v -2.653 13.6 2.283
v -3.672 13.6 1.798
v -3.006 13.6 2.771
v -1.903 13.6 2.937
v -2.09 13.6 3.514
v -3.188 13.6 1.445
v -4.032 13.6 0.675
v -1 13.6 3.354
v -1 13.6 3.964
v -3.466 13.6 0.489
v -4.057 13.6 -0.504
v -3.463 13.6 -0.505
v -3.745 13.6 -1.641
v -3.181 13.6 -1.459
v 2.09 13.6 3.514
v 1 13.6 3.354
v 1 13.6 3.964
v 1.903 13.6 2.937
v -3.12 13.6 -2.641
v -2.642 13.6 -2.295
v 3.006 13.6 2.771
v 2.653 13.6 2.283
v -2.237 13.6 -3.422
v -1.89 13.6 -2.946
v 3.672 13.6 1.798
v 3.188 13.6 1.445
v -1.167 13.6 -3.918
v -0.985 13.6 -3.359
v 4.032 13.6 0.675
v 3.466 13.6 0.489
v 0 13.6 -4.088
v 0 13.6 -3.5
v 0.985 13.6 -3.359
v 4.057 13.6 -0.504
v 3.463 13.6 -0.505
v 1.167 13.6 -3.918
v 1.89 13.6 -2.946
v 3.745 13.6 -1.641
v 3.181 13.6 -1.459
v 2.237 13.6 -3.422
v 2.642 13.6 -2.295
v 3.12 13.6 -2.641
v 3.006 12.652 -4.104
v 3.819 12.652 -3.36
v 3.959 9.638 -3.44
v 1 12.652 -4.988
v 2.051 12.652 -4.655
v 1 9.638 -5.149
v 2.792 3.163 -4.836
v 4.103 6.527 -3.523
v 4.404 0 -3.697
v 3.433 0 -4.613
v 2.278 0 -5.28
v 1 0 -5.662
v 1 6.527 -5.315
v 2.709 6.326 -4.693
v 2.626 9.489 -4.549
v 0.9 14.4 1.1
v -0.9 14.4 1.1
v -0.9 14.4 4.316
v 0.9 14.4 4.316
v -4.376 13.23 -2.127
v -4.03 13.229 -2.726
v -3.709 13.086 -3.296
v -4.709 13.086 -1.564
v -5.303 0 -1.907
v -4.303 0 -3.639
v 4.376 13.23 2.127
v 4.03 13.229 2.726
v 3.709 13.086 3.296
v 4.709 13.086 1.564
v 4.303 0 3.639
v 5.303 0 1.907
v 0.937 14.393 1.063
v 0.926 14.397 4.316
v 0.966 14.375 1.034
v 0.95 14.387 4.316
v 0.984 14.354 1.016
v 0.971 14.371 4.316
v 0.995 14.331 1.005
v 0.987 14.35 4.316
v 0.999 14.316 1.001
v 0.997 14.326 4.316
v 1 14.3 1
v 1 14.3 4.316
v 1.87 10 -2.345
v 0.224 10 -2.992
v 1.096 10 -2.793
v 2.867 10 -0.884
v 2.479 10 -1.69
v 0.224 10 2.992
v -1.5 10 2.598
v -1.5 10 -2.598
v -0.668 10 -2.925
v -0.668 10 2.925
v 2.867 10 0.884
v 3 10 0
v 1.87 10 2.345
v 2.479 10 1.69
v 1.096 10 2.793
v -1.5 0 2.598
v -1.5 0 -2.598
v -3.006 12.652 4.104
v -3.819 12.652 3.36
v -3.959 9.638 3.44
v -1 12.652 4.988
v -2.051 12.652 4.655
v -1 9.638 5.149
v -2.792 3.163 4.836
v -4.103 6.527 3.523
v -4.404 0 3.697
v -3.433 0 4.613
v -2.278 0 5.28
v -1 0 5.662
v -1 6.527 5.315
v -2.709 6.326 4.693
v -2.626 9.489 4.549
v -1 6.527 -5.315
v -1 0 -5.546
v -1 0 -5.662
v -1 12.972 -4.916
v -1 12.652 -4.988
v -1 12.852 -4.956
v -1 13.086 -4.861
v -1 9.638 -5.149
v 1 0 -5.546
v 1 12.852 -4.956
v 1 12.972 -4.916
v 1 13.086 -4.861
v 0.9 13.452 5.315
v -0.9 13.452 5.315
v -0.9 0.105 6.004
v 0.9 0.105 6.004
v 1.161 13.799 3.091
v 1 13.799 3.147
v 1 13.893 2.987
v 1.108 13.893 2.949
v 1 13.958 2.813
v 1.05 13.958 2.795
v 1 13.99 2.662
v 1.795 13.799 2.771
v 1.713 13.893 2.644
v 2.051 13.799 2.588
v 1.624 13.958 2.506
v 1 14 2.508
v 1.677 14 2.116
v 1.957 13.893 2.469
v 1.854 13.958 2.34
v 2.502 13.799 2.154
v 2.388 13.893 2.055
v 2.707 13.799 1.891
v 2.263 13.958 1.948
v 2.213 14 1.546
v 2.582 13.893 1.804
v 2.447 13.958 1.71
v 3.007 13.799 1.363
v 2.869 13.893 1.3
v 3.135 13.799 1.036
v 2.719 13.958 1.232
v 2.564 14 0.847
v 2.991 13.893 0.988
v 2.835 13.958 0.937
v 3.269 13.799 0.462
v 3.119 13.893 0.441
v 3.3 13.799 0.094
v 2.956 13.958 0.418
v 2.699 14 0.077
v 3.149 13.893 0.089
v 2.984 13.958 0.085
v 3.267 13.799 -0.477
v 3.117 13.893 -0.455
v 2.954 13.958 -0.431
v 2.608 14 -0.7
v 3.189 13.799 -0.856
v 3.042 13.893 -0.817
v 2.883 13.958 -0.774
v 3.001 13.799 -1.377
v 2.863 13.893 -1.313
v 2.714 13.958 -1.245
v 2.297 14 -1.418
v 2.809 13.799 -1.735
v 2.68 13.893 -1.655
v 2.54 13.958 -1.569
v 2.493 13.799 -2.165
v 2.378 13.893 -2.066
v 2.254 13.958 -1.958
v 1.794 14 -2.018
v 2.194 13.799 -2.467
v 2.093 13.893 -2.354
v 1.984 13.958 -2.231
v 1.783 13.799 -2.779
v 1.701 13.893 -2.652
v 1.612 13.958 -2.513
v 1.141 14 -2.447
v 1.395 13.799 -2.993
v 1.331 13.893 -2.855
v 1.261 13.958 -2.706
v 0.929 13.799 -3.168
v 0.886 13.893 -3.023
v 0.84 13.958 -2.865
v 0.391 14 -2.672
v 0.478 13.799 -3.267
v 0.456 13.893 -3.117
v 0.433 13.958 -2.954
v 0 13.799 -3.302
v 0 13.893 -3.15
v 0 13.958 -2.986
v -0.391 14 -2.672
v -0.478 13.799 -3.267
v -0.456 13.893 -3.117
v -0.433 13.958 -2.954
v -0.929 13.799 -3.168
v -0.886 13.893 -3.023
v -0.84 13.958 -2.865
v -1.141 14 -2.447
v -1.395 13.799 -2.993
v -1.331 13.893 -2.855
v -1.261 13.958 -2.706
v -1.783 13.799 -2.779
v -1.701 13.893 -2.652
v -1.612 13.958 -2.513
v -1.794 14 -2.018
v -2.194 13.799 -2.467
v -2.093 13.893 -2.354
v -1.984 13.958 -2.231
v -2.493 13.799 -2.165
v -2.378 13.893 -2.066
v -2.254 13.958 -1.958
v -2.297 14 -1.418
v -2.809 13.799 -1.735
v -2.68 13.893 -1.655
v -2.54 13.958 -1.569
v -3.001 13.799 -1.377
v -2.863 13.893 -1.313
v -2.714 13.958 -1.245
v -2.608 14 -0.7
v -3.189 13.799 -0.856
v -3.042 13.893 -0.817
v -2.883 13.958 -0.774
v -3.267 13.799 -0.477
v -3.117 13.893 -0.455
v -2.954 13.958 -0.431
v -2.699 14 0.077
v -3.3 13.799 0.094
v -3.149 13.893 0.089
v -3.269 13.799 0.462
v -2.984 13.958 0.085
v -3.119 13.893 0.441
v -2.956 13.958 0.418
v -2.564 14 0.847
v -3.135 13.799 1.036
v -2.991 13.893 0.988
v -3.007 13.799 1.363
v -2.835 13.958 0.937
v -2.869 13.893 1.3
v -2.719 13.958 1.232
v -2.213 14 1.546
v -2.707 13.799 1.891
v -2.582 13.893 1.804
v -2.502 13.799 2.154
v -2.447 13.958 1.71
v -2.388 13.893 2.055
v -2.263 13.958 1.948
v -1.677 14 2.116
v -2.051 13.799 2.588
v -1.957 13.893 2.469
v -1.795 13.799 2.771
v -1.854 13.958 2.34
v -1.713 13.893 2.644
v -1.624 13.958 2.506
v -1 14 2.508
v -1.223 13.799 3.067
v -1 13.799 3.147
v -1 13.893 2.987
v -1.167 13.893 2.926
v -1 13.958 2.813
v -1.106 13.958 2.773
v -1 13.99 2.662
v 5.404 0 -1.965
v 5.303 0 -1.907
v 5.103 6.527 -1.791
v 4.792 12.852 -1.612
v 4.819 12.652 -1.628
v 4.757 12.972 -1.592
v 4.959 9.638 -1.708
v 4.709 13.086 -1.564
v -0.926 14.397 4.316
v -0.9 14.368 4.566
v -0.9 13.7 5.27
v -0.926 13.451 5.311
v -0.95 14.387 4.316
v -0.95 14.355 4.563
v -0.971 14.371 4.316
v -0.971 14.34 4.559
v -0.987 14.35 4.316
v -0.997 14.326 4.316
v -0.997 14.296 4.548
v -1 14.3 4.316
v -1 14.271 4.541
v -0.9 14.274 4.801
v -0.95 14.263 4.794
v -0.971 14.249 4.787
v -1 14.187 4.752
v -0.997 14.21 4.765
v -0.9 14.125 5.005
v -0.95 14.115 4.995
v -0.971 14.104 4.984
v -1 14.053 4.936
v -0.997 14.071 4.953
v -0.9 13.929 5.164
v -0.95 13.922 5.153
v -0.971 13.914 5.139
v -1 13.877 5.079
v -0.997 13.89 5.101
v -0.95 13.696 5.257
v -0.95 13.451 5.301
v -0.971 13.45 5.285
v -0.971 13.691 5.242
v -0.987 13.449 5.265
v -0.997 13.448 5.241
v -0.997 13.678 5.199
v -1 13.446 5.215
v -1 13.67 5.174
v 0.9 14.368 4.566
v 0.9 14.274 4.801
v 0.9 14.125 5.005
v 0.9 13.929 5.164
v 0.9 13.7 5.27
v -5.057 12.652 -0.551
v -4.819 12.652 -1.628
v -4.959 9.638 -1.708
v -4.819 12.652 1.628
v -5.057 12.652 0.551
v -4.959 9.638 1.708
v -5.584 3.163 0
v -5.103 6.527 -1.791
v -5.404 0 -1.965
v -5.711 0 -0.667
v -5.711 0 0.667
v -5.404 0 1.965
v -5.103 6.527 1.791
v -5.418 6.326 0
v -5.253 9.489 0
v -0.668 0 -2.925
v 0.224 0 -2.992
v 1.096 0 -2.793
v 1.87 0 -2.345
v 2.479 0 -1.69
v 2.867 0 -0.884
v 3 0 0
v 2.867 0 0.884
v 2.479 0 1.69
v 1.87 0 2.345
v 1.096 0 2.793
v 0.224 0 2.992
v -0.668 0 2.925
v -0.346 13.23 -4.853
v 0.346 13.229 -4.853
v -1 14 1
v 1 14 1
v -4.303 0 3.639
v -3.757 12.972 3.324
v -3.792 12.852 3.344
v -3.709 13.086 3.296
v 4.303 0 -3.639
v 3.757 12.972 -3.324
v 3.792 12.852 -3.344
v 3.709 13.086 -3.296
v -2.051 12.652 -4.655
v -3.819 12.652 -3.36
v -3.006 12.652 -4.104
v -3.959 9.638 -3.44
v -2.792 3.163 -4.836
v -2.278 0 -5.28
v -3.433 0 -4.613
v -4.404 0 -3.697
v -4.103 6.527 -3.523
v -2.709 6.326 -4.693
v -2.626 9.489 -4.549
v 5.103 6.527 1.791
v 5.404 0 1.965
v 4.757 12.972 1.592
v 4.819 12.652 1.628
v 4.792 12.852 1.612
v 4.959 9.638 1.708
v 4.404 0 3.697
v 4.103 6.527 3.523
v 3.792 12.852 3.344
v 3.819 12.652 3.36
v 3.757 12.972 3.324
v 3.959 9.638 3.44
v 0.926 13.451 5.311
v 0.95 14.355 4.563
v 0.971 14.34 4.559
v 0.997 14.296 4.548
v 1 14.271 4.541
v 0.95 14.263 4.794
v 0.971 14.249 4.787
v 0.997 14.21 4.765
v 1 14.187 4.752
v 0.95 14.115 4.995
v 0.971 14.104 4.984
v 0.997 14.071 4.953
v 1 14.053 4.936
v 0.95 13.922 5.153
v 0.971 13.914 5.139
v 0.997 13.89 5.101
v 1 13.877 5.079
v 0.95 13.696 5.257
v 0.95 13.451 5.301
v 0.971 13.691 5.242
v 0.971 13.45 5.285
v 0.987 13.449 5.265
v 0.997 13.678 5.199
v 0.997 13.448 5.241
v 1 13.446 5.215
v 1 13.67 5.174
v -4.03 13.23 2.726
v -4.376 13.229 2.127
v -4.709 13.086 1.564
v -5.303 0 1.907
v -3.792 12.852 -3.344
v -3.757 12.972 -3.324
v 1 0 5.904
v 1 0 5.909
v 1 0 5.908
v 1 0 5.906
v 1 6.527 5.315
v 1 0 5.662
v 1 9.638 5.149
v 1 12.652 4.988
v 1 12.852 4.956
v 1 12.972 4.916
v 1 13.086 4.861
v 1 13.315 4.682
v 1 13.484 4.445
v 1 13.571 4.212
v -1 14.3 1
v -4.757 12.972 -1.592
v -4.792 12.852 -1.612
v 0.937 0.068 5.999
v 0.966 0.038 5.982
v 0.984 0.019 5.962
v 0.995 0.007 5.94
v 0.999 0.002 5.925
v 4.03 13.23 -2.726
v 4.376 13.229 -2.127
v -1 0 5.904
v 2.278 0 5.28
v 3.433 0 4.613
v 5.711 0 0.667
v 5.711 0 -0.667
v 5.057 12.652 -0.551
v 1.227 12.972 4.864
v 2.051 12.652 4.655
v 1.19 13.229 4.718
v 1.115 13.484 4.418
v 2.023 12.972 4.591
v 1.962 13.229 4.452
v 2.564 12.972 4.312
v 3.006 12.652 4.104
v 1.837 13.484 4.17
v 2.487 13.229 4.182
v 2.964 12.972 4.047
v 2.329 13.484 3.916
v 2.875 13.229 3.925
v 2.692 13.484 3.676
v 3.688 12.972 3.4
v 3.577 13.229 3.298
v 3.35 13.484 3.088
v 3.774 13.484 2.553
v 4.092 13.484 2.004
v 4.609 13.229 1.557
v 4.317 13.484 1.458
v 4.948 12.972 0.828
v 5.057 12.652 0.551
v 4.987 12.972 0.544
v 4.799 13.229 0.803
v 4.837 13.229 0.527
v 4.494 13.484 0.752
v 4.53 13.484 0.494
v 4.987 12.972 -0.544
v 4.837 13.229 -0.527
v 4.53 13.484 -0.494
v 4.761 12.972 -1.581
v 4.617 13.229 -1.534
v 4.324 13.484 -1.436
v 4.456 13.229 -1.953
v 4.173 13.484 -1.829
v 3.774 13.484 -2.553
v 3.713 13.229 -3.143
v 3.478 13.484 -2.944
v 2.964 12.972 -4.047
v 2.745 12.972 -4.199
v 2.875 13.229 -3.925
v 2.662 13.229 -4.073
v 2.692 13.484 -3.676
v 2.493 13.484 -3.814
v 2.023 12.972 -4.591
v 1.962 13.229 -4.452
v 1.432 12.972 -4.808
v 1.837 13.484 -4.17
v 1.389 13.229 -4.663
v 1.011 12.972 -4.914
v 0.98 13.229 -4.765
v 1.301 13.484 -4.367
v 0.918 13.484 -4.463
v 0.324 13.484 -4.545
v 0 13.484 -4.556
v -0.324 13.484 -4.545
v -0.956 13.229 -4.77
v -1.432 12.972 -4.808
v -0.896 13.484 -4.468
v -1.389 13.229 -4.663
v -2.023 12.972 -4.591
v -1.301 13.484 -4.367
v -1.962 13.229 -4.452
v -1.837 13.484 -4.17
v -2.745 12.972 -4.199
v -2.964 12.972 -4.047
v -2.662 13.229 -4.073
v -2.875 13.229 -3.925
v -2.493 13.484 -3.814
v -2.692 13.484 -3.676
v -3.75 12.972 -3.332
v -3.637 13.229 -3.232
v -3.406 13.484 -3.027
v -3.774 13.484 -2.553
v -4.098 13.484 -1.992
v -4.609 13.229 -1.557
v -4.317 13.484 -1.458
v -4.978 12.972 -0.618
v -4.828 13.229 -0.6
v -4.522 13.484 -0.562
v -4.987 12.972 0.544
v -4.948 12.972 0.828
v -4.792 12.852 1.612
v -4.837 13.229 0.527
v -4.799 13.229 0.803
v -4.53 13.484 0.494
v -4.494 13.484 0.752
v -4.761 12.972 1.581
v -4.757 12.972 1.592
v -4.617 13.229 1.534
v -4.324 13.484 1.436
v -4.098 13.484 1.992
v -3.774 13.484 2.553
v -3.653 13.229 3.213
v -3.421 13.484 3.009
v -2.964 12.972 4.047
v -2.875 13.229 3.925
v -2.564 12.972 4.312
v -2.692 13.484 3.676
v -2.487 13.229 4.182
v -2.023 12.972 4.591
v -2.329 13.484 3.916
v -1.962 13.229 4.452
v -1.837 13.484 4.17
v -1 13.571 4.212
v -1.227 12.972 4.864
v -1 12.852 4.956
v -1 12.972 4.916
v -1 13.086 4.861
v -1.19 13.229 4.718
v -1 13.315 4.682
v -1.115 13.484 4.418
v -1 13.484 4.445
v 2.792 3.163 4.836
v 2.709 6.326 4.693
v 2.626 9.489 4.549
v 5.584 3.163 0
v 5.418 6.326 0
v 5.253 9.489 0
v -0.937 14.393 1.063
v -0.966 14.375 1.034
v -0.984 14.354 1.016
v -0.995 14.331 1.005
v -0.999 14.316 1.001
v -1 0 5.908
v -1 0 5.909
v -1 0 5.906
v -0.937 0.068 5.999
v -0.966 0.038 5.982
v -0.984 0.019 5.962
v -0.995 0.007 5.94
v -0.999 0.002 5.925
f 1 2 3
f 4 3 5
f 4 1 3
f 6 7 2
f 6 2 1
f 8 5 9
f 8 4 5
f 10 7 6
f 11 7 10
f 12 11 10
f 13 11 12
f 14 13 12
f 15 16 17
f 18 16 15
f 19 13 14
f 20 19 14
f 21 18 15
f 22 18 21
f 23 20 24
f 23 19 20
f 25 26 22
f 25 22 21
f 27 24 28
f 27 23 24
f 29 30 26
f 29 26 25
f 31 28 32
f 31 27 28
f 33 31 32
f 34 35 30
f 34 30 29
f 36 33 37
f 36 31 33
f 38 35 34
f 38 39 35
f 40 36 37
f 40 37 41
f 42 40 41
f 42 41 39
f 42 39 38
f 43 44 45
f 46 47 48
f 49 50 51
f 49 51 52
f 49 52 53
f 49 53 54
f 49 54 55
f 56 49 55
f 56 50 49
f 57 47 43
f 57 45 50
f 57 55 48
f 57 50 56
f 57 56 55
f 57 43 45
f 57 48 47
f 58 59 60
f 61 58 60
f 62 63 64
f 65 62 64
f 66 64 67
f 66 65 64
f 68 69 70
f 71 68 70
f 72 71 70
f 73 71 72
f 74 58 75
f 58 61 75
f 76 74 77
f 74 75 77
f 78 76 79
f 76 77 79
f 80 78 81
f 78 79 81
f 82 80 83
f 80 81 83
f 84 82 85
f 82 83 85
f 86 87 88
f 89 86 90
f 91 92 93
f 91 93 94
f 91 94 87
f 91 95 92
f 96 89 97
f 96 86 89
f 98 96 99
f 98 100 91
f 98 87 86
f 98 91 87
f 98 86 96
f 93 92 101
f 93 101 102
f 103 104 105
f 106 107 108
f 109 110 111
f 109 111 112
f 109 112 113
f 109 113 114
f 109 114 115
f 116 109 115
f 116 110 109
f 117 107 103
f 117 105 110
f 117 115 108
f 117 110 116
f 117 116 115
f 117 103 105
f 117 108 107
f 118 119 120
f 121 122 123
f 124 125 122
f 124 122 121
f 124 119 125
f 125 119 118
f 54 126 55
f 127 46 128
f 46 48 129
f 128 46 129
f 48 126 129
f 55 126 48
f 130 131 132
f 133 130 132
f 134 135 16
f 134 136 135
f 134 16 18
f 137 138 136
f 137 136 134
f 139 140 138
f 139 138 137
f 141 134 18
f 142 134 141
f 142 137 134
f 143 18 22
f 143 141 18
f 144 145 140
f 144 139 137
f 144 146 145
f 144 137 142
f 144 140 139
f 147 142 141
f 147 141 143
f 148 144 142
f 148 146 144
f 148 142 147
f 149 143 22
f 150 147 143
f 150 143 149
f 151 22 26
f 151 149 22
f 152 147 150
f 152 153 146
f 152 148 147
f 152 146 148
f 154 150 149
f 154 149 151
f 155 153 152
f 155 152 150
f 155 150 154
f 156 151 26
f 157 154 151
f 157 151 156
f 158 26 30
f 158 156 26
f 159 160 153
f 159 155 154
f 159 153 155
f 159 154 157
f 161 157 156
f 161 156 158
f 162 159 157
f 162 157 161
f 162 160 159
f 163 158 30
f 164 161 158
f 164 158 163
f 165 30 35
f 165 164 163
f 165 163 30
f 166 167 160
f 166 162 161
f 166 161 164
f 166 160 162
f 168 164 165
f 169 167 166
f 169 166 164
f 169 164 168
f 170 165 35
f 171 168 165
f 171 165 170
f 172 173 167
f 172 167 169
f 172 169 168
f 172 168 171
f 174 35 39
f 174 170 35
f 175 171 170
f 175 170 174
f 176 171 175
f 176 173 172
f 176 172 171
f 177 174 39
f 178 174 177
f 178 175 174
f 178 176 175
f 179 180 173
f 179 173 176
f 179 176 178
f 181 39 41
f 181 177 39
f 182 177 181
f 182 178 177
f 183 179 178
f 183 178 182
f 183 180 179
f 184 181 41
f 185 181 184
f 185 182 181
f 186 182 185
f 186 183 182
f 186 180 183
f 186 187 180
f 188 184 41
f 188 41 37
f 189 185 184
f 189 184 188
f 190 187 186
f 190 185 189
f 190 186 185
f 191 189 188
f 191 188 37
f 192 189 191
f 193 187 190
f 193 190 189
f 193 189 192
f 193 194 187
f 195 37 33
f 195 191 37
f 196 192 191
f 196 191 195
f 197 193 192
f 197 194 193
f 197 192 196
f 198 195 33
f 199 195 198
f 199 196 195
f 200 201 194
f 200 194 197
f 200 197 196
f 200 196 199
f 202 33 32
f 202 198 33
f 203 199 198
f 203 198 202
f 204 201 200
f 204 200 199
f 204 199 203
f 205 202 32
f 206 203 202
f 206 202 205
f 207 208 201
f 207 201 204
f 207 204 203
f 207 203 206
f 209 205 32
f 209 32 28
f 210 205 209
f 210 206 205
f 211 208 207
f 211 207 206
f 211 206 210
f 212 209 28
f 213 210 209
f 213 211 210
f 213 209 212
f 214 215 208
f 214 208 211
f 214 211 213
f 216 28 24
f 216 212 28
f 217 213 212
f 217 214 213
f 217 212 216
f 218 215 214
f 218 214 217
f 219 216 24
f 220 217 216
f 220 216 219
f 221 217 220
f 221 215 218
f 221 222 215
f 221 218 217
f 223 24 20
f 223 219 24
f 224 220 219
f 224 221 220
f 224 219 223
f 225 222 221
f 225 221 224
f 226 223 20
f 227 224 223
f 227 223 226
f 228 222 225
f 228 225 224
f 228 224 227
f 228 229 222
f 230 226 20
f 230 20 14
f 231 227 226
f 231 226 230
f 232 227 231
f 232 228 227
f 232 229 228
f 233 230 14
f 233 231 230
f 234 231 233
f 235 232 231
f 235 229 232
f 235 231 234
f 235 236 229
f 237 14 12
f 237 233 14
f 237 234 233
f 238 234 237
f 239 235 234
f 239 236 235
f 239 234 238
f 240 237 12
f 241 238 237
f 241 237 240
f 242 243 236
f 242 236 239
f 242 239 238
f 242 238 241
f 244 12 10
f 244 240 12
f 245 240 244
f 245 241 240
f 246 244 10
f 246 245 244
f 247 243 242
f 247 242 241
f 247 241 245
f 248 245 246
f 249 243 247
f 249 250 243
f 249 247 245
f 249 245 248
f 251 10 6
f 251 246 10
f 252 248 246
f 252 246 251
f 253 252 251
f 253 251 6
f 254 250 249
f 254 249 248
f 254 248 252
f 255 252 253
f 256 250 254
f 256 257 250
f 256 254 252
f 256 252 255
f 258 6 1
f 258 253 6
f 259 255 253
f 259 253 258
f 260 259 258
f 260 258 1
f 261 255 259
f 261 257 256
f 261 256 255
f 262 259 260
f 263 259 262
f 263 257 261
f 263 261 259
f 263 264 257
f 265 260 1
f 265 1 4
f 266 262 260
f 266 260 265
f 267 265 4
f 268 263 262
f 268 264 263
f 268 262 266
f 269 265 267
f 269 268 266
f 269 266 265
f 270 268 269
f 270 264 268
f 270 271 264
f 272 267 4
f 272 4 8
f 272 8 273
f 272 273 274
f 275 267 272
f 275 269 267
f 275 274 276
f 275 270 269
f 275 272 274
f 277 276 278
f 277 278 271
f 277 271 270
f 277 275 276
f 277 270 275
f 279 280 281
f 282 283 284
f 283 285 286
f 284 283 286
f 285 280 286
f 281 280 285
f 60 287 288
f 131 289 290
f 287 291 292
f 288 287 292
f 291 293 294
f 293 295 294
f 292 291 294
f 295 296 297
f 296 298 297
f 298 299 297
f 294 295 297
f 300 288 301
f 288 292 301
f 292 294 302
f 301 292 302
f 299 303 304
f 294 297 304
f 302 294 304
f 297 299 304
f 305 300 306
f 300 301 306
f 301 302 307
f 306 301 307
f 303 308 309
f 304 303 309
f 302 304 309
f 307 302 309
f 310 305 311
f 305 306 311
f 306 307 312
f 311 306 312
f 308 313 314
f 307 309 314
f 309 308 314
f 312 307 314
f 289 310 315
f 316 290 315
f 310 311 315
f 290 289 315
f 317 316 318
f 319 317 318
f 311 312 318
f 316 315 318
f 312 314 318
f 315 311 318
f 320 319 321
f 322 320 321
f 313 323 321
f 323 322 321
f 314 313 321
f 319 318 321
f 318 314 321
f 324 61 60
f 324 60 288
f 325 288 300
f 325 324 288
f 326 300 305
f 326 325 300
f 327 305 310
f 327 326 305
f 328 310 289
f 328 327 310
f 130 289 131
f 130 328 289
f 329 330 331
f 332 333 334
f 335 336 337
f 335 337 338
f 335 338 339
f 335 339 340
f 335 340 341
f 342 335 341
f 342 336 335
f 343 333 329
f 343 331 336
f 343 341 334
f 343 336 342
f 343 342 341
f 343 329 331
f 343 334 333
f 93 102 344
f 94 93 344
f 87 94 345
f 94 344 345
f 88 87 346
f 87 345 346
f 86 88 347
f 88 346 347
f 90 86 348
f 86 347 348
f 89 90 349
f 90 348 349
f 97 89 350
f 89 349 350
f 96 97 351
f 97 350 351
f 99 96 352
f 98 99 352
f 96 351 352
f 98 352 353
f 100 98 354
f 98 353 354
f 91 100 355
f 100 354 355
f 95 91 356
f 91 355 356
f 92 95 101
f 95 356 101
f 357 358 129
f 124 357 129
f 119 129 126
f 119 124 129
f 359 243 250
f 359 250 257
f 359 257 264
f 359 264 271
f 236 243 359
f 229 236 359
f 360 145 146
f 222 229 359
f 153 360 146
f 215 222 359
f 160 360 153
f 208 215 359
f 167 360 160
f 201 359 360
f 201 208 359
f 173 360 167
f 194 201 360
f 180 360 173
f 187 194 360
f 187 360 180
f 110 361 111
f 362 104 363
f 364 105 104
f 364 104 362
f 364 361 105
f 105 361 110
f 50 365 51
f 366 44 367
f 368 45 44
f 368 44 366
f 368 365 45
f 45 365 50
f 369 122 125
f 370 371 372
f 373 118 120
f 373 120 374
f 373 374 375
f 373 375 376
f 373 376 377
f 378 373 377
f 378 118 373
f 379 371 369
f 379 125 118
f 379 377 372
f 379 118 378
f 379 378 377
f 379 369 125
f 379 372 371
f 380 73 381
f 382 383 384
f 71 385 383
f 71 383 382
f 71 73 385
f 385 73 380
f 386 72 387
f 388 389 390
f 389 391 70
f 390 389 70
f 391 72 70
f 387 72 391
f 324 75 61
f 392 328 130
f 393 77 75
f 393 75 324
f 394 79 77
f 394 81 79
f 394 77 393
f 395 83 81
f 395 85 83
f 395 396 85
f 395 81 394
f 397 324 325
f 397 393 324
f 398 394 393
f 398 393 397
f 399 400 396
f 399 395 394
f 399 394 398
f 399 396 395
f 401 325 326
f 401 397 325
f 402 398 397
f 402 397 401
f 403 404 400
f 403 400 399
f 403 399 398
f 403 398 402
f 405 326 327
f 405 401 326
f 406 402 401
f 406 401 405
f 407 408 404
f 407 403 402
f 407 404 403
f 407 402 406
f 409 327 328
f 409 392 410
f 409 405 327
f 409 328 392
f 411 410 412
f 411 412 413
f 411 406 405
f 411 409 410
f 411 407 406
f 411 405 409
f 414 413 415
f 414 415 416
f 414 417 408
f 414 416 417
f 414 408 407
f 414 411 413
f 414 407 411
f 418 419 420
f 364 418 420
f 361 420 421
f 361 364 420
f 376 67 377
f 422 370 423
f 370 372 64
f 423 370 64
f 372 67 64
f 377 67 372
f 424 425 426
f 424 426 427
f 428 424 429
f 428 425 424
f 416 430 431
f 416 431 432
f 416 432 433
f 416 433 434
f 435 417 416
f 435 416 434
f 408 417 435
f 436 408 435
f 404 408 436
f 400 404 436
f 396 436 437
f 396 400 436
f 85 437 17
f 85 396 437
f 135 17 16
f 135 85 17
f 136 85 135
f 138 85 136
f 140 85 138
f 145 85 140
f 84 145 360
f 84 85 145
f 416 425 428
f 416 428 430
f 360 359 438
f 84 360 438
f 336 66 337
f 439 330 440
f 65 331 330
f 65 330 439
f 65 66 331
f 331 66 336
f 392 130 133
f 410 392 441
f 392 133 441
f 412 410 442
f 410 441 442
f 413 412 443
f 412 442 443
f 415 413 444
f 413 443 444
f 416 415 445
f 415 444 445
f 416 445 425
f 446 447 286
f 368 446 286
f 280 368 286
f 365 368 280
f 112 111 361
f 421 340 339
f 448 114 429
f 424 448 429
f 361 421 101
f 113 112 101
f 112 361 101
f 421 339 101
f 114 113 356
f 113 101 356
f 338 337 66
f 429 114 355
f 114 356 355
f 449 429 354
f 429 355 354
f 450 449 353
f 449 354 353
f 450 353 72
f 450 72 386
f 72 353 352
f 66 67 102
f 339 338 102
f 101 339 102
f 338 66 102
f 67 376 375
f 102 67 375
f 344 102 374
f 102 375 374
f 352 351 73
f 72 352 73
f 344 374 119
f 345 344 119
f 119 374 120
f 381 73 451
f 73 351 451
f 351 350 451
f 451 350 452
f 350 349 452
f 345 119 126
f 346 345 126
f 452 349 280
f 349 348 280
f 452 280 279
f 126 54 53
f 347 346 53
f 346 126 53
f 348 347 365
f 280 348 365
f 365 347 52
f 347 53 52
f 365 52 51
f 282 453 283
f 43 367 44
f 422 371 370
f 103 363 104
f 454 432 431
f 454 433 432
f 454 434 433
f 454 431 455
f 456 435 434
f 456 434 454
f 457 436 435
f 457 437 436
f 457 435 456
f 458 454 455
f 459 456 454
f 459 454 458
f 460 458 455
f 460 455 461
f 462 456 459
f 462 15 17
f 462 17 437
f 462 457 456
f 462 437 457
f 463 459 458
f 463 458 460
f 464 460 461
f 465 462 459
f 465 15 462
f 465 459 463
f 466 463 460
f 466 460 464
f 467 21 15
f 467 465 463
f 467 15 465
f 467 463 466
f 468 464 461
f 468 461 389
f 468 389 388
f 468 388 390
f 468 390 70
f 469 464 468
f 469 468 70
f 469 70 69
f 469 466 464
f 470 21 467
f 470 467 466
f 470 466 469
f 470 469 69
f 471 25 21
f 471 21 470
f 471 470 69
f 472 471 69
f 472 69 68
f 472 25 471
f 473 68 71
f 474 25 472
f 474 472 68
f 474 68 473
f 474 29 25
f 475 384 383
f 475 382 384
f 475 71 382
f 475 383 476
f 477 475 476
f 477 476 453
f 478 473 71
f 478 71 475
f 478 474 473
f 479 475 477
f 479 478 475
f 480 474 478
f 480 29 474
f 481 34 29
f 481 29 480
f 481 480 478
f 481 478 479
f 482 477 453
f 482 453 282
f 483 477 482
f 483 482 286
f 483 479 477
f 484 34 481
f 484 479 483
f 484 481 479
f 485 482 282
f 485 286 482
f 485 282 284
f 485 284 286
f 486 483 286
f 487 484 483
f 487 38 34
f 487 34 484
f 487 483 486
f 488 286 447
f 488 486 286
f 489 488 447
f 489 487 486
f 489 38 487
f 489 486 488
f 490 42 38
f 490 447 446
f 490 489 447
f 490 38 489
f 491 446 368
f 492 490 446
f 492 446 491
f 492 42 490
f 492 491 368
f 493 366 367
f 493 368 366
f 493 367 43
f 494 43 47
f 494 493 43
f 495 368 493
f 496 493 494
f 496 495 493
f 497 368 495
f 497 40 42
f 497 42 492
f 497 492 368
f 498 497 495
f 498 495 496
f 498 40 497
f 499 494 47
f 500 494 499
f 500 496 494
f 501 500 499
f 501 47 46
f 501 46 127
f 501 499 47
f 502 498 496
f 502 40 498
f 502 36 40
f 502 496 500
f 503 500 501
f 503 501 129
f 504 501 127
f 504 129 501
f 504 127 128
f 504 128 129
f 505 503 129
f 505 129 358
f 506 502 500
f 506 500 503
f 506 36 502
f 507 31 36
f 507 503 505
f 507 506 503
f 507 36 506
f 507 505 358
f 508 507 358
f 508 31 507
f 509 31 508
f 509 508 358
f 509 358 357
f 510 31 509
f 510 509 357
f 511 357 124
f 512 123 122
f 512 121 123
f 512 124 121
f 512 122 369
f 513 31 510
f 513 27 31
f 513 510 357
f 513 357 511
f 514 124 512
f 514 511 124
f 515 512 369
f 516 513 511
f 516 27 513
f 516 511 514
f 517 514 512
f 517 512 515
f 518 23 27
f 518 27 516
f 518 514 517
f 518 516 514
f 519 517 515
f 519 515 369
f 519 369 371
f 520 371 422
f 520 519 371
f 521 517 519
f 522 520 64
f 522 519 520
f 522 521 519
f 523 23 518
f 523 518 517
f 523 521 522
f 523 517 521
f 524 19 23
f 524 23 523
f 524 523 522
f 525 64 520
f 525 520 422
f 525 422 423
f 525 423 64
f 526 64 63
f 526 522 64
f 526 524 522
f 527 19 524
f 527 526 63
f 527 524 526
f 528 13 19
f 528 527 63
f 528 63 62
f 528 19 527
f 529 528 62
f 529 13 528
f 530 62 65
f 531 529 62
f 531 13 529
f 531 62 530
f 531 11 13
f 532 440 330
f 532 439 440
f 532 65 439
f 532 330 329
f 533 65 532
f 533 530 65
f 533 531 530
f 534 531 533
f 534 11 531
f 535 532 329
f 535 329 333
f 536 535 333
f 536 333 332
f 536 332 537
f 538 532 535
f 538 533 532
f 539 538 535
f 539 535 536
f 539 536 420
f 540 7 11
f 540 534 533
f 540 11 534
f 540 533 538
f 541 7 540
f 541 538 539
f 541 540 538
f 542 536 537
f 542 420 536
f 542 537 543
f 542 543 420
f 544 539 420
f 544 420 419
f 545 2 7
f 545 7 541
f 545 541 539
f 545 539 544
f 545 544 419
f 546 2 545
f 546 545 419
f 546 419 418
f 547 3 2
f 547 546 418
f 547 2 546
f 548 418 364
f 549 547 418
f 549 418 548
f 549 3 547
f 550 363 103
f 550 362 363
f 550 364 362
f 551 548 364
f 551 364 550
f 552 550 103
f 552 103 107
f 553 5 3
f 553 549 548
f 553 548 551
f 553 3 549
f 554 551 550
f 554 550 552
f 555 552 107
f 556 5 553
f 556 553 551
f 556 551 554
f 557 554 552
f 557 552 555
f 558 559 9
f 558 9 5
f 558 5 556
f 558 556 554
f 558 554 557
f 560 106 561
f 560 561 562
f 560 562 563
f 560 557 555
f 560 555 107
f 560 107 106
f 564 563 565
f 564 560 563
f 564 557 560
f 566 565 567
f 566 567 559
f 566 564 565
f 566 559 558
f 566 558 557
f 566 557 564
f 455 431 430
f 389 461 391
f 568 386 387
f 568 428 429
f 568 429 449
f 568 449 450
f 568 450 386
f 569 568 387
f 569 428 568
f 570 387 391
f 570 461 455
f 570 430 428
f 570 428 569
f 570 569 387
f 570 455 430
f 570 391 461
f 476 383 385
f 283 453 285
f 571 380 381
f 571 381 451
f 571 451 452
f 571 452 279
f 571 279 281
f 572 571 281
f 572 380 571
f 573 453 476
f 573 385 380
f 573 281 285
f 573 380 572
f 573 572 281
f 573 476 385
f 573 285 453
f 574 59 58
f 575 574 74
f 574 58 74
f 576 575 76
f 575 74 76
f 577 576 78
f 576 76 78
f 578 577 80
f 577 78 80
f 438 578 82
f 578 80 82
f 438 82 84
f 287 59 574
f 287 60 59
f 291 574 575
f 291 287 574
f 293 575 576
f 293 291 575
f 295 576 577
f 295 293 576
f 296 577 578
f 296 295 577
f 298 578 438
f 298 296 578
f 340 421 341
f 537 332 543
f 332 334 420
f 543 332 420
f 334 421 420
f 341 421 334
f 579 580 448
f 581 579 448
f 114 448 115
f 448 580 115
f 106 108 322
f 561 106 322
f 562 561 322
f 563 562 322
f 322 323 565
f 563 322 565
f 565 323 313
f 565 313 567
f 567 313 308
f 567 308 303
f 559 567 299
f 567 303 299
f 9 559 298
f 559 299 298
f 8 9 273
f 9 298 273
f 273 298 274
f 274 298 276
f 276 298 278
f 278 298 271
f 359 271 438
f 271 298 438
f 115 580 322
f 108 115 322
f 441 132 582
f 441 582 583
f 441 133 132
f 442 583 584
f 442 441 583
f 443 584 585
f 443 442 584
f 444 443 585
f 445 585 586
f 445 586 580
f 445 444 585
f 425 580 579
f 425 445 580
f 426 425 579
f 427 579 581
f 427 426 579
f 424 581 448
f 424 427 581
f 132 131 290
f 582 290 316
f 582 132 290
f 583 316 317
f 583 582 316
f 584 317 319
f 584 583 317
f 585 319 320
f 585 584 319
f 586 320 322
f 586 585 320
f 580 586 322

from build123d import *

# Parameters (mm, degrees)
SKETCH1_R                = 5.75
BOSS_EXTRUDE1_DEPTH      = 14
BOSS_EXTRUDE1_TAPER      = 3
SKETCH2_OUTSIDE_W        = 17.792
SKETCH2_OUTSIDE_H        = 17.792
SKETCH2_OUTSIDE_R        = 3.5
CUT_EXTRUDE1_DEPTH       = 0.4
FILLET2_R                = 1
FILLET3_R                = 1
CUT_EXTRUDE2_DEPTH       = 1
CIRPATTERN1_COUNT        = 6
BOSS_EXTRUDE2_DEPTH      = 1
BOSS_EXTRUDE2_DEPTH_BACK = 1
FILLET4_R                = 1
FILLET5_R                = 0.1
CUT_EXTRUDE3_DEPTH       = 10


with BuildPart() as part:
    # Sketch1 → Boss-Extrude1 (new body)
    with BuildSketch(Plane(origin=(0, 0, 0), x_dir=(1, 0, 0), z_dir=(0, 1, 0))):
        Circle(SKETCH1_R)
    extrude(amount=BOSS_EXTRUDE1_DEPTH, taper=BOSS_EXTRUDE1_TAPER)

    # Sketch2 outside → Cut-Extrude1 (cut)
    with BuildSketch(Plane(origin=(0, 14, 0), x_dir=(1, 0, 0), z_dir=(0, 1, 0))):
        Rectangle(SKETCH2_OUTSIDE_W, SKETCH2_OUTSIDE_H)
        with Locations(Location((0, 0, 0), (0, 0, 270))):
            Circle(SKETCH2_OUTSIDE_R, mode=Mode.SUBTRACT)
    extrude(amount=-CUT_EXTRUDE1_DEPTH, mode=Mode.SUBTRACT)

    # Fillet2
    # the kernel refuses this fillet: 1 mm, written as the material it takes off along each edge
    with BuildSketch(Plane(origin=(0, 14, 0), x_dir=(0, 0, 1), z_dir=(-1, 0, 0))) as fillet2_piece_1:
        with BuildLine():
            CenterArc((2.7, -1), FILLET2_R, 36.869897646, 53.130102354)
            Line((2.7, 0), (2.7, 0.02))
            Line((2.7, 0.02), (3.5, 0.02))
            Line((3.5, 0.02), (3.52, 0))
            ThreePointArc((3.52, 0), (3.52, -0.2), (3.516, -0.388))
            Line((3.516, -0.388), (3.5, -0.4))
        make_face()
    revolve(axis=Axis((0, 14, 0), (0, 1, 0)), mode=Mode.SUBTRACT)

    # Fillet3
    fillet3_edges = [part.edges().sort_by_distance(p)[0] for p in [
        (-5.037254202, 13.6, 0),
    ]]
    fillet(fillet3_edges, radius=FILLET3_R)

    # Sketch3 → Cut-Extrude2 (cut, symmetric)
    with BuildSketch(Plane(origin=(0, 0, 0), x_dir=(0, 0, -1), z_dir=(1, 0, 0))):
        Polygon((-6.905330432, 14.229180533), (-4.800601017, 14.229180533), (-5.581491189, -0.671091575), (-7.885175425, -0.671091575), align=None)
    cut_extrude2 = extrude(amount=CUT_EXTRUDE2_DEPTH, both=True, mode=Mode.SUBTRACT)

    # CirPattern1: Cut-Extrude2 ×6 about axis
    cirpattern1_axis = Axis((0, 0, 0), (0, 1, 0))
    for i in range(1, CIRPATTERN1_COUNT):
        add(cut_extrude2.rotate(cirpattern1_axis, i * 360 / CIRPATTERN1_COUNT), mode=Mode.SUBTRACT)

    # Sketch5 → Boss-Extrude2 (add, two sides: drawn at the far end of the back side and taken through both)
    with BuildSketch(Plane(origin=(0, 0, 0), x_dir=(0, 0, -1), z_dir=(1, 0, 0)).offset(-BOSS_EXTRUDE2_DEPTH_BACK)):
        Polygon((-5.265563969, 0), (-4.679794572, 13.176067739), (-1, 13.176067739), (-1, 14.4), (-5.265563969, 14.4), (-6.009500485, 0), align=None)
    extrude(amount=BOSS_EXTRUDE2_DEPTH + BOSS_EXTRUDE2_DEPTH_BACK)

    # Fillet4
    fillet4_edges = [part.edges().sort_by_distance(p)[0] for p in [
        (0, 14.4, 5.265563969),
    ]]
    fillet(fillet4_edges, radius=FILLET4_R)

    # Fillet5
    fillet5_edges = [part.edges().sort_by_distance(p)[0] for p in [
        (0, 0, 6.009500485),
        (-1, 14.4, 2.657946311),
        (0, 14.4, 1),
        (1, 14.4, 2.657946311),
        (1, 6.725796726, 5.662030639),
        (1, 14.125118422, 5.004516811),
        (-1, 6.725796726, 5.662030639),
        (-1, 14.125118422, 5.004516811),
    ]]
    fillet(fillet5_edges, radius=FILLET5_R)

    # Sketch6 → Cut-Extrude3 (cut)
    with BuildSketch(Plane.XZ):
        with BuildLine():
            Line((-1.5, 2.598076211), (-1.5, -2.598076211))
            ThreePointArc((-1.5, -2.598076211), (3, 0), (-1.5, 2.598076211))
        make_face()
    extrude(amount=-CUT_EXTRUDE3_DEPTH, mode=Mode.SUBTRACT)


solid = part.part
